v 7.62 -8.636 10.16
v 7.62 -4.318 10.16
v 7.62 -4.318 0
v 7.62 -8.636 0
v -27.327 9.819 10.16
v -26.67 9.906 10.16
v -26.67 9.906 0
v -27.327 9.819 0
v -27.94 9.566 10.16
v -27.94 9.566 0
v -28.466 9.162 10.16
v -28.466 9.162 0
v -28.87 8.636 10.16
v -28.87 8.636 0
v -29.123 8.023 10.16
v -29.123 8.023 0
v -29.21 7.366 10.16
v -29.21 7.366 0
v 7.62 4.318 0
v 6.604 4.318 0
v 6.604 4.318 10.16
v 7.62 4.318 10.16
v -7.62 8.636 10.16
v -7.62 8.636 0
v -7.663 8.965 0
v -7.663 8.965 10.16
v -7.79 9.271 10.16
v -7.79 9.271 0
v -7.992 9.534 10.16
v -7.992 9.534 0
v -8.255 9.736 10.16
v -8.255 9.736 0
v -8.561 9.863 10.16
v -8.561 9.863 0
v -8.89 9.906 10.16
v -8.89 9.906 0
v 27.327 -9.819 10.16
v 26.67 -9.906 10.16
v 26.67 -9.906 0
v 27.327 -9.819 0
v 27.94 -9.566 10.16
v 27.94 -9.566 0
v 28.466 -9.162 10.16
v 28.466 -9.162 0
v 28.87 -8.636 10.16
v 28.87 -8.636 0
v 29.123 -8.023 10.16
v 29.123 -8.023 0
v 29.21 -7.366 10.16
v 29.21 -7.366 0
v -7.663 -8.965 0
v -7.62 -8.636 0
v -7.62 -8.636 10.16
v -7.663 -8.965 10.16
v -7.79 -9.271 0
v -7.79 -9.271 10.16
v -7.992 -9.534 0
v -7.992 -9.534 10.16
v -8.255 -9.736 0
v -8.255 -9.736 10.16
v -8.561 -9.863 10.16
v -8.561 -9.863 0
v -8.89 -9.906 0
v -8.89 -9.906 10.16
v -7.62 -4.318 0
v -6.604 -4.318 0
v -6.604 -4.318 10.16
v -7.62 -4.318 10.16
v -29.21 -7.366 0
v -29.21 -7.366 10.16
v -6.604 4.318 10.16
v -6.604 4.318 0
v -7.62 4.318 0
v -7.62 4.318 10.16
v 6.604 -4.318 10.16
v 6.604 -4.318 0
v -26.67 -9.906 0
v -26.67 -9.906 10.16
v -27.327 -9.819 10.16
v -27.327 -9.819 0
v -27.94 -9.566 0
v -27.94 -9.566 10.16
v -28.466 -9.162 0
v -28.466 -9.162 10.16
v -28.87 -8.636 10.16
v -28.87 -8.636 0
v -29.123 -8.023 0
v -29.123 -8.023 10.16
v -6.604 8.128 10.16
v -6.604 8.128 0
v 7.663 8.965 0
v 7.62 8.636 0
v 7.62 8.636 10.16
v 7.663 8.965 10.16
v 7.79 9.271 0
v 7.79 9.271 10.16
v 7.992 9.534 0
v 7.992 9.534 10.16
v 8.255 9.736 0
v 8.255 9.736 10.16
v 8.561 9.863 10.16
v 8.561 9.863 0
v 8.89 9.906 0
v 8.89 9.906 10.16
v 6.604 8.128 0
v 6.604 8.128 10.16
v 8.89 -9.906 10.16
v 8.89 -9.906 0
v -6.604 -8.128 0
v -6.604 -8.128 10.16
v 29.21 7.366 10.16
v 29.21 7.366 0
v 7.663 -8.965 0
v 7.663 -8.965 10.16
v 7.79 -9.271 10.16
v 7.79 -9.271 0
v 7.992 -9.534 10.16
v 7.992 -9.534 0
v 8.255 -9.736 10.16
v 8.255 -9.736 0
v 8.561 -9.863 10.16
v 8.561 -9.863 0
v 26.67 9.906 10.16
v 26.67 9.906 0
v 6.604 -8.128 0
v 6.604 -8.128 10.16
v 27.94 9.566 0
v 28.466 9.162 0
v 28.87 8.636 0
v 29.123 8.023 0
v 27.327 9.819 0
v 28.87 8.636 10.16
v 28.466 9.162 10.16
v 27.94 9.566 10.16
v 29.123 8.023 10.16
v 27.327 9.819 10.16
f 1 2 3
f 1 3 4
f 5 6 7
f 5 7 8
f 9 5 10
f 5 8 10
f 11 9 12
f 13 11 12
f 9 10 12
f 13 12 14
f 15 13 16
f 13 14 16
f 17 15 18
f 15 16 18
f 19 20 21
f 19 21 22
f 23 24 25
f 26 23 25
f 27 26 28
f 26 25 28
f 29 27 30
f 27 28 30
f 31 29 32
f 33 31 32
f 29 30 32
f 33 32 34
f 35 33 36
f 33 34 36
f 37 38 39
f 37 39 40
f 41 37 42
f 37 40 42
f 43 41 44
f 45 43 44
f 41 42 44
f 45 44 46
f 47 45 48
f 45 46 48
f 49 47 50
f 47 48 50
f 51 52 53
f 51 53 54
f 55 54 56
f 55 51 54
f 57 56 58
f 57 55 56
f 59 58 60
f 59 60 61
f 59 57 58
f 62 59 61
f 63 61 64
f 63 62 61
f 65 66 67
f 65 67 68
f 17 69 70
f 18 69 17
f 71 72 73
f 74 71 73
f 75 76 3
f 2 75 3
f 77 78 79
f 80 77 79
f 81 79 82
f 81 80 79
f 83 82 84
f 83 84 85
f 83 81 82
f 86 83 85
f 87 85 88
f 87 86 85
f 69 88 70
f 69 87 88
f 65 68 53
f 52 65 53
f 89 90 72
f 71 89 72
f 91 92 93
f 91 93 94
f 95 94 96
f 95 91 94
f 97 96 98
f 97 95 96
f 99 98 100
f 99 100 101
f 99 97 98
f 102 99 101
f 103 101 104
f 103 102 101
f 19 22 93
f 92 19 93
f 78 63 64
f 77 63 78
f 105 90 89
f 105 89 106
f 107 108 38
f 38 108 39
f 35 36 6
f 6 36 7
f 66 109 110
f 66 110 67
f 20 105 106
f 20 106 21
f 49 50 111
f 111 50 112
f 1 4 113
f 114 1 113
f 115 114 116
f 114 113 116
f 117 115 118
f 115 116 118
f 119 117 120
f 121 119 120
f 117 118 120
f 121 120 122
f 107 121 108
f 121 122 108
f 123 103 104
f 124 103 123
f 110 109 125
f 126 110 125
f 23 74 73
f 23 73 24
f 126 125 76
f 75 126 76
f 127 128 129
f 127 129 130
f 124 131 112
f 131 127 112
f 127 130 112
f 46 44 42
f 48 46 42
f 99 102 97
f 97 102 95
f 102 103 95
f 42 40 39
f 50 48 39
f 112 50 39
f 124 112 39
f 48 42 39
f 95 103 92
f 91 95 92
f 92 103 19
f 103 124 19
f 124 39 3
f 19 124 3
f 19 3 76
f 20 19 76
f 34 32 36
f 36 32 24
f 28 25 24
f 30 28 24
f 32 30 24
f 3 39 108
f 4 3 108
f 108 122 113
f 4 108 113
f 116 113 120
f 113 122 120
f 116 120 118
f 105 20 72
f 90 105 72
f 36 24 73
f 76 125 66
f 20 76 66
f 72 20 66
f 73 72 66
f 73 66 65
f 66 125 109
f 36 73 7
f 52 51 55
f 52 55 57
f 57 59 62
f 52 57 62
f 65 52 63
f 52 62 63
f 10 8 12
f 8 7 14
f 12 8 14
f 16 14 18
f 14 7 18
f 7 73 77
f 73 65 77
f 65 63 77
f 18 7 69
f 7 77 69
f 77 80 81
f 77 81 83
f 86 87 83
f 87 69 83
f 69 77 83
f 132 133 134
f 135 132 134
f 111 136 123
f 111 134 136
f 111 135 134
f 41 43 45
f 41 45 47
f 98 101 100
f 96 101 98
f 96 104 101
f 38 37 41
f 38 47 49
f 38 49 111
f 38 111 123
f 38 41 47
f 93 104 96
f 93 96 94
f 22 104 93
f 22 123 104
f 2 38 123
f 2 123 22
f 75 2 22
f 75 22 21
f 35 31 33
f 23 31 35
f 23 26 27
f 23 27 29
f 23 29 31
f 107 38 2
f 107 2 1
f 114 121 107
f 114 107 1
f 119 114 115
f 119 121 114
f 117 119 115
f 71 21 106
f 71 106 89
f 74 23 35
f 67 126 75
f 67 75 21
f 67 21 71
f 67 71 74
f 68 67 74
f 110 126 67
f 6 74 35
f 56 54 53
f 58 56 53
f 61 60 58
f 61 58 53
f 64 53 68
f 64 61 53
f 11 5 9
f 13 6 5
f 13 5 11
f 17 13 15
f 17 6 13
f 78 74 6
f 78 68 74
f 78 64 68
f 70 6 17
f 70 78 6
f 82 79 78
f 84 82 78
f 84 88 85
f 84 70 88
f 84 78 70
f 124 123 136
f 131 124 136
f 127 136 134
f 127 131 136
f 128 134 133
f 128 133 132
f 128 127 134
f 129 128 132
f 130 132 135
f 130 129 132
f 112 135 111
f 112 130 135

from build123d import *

# Parameters (mm, degrees)
F1_DEPTH = 10.16


with BuildPart() as f1:
    # F0 (on Top) → F1 (new body)
    with BuildSketch(Plane.XY):
        with BuildLine():
            Line((-29.21, 0), (0, 0))
            Line((0, 0), (0, 8.128))
            Line((0, 8.128), (-6.604, 8.128))
            Line((-6.604, 8.128), (-6.604, 4.318))
            Line((-6.604, 4.318), (-7.62, 4.318))
            Line((-7.62, 4.318), (-7.62, 5.334))
            Line((-7.62, 5.334), (-7.62, 8.636))
            ThreePointArc((-7.62, 8.636), (-7.991974, 9.534026), (-8.89, 9.906))
            Line((-8.89, 9.906), (-26.67, 9.906))
            ThreePointArc((-26.67, 9.906), (-28.466051, 9.162051), (-29.21, 7.366))
            Line((-29.21, 7.366), (-29.21, 0))
        make_face()
    extrude(amount=F1_DEPTH)

    # F2: F1 across face


with BuildPart() as f1_1:
    add(f1.part)
    add(f1.part.mirror(Plane(origin=(0, 4.064, 5.08), x_dir=(0, 1, 0), z_dir=(1, 0, 0))))

    # F3: F1 across face


with BuildPart() as f1_2:
    add(f1_1.part)
    add(f1_1.part.mirror(Plane(origin=(0, 0, 5.08), x_dir=(1, 0, 0), z_dir=(0, -1, 0))))


solid = f1_2.part
